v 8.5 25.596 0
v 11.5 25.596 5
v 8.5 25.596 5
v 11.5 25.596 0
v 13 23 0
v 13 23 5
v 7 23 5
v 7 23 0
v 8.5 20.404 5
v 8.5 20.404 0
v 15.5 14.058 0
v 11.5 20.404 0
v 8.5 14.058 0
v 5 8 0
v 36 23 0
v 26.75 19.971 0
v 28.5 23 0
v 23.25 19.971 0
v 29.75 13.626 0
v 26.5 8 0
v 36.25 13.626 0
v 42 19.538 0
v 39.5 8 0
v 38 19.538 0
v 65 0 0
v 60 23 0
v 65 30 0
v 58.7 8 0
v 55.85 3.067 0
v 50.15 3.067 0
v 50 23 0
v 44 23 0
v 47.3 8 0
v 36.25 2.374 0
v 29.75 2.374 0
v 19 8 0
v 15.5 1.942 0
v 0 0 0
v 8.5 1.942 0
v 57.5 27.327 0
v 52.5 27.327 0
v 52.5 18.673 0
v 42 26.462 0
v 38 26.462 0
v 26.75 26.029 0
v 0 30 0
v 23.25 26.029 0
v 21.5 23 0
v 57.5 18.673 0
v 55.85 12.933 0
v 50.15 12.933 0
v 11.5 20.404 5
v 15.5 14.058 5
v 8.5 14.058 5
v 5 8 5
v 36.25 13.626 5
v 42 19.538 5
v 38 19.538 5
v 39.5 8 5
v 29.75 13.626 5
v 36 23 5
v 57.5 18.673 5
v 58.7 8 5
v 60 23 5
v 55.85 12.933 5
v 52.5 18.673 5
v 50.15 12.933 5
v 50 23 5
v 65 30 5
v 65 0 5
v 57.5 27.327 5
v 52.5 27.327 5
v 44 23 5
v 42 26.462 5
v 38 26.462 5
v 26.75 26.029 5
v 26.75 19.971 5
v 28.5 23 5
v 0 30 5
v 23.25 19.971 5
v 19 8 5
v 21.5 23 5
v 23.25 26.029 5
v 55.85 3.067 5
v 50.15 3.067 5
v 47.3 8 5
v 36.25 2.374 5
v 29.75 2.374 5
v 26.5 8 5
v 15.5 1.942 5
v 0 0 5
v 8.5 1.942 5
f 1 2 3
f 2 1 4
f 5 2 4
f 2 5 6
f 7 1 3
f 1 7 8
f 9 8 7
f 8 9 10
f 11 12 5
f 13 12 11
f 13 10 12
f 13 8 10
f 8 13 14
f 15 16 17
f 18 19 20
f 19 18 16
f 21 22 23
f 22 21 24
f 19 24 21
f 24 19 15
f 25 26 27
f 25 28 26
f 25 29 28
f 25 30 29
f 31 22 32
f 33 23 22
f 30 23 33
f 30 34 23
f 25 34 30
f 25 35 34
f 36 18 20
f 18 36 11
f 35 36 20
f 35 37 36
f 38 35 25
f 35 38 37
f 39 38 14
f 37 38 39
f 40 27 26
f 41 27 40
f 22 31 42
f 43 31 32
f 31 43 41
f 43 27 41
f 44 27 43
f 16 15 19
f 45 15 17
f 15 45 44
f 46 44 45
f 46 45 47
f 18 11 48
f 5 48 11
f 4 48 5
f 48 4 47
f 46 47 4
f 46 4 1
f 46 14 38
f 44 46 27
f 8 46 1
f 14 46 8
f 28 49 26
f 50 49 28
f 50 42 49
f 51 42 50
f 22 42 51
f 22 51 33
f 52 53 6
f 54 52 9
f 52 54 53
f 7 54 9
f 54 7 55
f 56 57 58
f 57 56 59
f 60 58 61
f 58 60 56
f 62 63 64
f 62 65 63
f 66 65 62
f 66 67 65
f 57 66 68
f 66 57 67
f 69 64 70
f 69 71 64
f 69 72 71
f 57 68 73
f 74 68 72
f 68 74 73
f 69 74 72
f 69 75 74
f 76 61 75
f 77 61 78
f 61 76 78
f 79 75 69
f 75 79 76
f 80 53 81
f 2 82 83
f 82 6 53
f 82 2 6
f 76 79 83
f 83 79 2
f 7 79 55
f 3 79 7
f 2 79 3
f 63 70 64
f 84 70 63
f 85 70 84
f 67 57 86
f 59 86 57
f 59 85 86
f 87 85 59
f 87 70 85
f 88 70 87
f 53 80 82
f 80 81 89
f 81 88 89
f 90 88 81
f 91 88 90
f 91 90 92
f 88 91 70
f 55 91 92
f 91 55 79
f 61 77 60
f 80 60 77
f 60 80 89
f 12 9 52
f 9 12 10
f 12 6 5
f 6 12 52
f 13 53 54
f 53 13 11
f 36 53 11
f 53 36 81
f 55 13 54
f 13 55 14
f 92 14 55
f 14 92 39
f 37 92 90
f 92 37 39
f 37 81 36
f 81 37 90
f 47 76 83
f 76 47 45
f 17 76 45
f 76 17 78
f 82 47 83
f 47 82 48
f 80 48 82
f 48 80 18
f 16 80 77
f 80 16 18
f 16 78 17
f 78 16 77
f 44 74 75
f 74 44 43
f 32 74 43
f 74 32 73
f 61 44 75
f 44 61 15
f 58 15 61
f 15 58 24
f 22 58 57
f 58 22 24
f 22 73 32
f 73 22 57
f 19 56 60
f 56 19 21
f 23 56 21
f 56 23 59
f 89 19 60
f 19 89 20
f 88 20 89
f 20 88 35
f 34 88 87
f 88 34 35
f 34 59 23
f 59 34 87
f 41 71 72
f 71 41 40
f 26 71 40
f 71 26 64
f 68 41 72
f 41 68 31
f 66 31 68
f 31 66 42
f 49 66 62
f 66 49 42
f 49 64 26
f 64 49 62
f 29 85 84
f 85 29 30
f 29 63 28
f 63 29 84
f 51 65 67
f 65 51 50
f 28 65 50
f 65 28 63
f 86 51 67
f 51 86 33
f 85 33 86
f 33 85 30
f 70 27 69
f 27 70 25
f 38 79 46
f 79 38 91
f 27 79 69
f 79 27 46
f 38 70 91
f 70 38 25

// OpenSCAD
difference() {
  translate([32.5000000000, 15.0000000000, 2.5000000000]) {
    scale([65.0000000000, 30.0000000000, 5.0000000000]) {
      translate([-0.5000000000, -0.5000000000, -0.5000000000]) {
        cube([1, 1, 1]);
      }
    }
  }
  union() {
    union() {
      union() {
        union() {
          union() {
            union() {
              translate([10.0000000000, 23.0000000000, 2.5000000000]) {
                scale([6.0000000000, 5.1960000000, 5.0000000000]) {
                  rotate([0.0000000000, 0.0000000000, -0.0000000000]) {
                    scale([0.5, 0.577, 1]) cylinder($fn = 6, center = true);
                  }
                }
              }
              translate([12.0000000000, 8.0000000000, 2.5000000000]) {
                scale([14.0000000000, 12.1240000000, 5.0000000000]) {
                  rotate([0.0000000000, 0.0000000000, -0.0000000000]) {
                    scale([0.5, 0.577, 1]) cylinder($fn = 6, center = true);
                  }
                }
              }
            }
            translate([25.0000000000, 23.0000000000, 2.5000000000]) {
              scale([7.0000000000, 6.0620000000, 5.0000000000]) {
                rotate([0.0000000000, 0.0000000000, -0.0000000000]) {
                  scale([0.5, 0.577, 1]) cylinder($fn = 6, center = true);
                }
              }
            }
          }
          translate([40.0000000000, 23.0000000000, 2.5000000000]) {
            scale([8.0000000000, 6.9280000000, 5.0000000000]) {
              rotate([0.0000000000, 0.0000000000, -0.0000000000]) {
                scale([0.5, 0.577, 1]) cylinder($fn = 6, center = true);
              }
            }
          }
        }
        translate([33.0000000000, 8.0000000000, 2.5000000000]) {
          scale([13.0000000000, 11.2580000000, 5.0000000000]) {
            rotate([0.0000000000, 0.0000000000, -0.0000000000]) {
              scale([0.5, 0.577, 1]) cylinder($fn = 6, center = true);
            }
          }
        }
      }
      translate([55.0000000000, 23.0000000000, 2.5000000000]) {
        scale([10.0000000000, 8.6600000000, 5.0000000000]) {
          rotate([0.0000000000, 0.0000000000, -0.0000000000]) {
            scale([0.5, 0.577, 1]) cylinder($fn = 6, center = true);
          }
        }
      }
    }
    translate([52.9999680000, 7.9999874480, 2.5000000000]) {
      scale([11.4000000000, 9.8720000000, 5.0000000000]) {
        rotate([0.0000000000, 0.0000000000, -0.0000000000]) {
          scale([0.5, 0.577, 1]) cylinder($fn = 6, center = true);
        }
      }
    }
  }
}
